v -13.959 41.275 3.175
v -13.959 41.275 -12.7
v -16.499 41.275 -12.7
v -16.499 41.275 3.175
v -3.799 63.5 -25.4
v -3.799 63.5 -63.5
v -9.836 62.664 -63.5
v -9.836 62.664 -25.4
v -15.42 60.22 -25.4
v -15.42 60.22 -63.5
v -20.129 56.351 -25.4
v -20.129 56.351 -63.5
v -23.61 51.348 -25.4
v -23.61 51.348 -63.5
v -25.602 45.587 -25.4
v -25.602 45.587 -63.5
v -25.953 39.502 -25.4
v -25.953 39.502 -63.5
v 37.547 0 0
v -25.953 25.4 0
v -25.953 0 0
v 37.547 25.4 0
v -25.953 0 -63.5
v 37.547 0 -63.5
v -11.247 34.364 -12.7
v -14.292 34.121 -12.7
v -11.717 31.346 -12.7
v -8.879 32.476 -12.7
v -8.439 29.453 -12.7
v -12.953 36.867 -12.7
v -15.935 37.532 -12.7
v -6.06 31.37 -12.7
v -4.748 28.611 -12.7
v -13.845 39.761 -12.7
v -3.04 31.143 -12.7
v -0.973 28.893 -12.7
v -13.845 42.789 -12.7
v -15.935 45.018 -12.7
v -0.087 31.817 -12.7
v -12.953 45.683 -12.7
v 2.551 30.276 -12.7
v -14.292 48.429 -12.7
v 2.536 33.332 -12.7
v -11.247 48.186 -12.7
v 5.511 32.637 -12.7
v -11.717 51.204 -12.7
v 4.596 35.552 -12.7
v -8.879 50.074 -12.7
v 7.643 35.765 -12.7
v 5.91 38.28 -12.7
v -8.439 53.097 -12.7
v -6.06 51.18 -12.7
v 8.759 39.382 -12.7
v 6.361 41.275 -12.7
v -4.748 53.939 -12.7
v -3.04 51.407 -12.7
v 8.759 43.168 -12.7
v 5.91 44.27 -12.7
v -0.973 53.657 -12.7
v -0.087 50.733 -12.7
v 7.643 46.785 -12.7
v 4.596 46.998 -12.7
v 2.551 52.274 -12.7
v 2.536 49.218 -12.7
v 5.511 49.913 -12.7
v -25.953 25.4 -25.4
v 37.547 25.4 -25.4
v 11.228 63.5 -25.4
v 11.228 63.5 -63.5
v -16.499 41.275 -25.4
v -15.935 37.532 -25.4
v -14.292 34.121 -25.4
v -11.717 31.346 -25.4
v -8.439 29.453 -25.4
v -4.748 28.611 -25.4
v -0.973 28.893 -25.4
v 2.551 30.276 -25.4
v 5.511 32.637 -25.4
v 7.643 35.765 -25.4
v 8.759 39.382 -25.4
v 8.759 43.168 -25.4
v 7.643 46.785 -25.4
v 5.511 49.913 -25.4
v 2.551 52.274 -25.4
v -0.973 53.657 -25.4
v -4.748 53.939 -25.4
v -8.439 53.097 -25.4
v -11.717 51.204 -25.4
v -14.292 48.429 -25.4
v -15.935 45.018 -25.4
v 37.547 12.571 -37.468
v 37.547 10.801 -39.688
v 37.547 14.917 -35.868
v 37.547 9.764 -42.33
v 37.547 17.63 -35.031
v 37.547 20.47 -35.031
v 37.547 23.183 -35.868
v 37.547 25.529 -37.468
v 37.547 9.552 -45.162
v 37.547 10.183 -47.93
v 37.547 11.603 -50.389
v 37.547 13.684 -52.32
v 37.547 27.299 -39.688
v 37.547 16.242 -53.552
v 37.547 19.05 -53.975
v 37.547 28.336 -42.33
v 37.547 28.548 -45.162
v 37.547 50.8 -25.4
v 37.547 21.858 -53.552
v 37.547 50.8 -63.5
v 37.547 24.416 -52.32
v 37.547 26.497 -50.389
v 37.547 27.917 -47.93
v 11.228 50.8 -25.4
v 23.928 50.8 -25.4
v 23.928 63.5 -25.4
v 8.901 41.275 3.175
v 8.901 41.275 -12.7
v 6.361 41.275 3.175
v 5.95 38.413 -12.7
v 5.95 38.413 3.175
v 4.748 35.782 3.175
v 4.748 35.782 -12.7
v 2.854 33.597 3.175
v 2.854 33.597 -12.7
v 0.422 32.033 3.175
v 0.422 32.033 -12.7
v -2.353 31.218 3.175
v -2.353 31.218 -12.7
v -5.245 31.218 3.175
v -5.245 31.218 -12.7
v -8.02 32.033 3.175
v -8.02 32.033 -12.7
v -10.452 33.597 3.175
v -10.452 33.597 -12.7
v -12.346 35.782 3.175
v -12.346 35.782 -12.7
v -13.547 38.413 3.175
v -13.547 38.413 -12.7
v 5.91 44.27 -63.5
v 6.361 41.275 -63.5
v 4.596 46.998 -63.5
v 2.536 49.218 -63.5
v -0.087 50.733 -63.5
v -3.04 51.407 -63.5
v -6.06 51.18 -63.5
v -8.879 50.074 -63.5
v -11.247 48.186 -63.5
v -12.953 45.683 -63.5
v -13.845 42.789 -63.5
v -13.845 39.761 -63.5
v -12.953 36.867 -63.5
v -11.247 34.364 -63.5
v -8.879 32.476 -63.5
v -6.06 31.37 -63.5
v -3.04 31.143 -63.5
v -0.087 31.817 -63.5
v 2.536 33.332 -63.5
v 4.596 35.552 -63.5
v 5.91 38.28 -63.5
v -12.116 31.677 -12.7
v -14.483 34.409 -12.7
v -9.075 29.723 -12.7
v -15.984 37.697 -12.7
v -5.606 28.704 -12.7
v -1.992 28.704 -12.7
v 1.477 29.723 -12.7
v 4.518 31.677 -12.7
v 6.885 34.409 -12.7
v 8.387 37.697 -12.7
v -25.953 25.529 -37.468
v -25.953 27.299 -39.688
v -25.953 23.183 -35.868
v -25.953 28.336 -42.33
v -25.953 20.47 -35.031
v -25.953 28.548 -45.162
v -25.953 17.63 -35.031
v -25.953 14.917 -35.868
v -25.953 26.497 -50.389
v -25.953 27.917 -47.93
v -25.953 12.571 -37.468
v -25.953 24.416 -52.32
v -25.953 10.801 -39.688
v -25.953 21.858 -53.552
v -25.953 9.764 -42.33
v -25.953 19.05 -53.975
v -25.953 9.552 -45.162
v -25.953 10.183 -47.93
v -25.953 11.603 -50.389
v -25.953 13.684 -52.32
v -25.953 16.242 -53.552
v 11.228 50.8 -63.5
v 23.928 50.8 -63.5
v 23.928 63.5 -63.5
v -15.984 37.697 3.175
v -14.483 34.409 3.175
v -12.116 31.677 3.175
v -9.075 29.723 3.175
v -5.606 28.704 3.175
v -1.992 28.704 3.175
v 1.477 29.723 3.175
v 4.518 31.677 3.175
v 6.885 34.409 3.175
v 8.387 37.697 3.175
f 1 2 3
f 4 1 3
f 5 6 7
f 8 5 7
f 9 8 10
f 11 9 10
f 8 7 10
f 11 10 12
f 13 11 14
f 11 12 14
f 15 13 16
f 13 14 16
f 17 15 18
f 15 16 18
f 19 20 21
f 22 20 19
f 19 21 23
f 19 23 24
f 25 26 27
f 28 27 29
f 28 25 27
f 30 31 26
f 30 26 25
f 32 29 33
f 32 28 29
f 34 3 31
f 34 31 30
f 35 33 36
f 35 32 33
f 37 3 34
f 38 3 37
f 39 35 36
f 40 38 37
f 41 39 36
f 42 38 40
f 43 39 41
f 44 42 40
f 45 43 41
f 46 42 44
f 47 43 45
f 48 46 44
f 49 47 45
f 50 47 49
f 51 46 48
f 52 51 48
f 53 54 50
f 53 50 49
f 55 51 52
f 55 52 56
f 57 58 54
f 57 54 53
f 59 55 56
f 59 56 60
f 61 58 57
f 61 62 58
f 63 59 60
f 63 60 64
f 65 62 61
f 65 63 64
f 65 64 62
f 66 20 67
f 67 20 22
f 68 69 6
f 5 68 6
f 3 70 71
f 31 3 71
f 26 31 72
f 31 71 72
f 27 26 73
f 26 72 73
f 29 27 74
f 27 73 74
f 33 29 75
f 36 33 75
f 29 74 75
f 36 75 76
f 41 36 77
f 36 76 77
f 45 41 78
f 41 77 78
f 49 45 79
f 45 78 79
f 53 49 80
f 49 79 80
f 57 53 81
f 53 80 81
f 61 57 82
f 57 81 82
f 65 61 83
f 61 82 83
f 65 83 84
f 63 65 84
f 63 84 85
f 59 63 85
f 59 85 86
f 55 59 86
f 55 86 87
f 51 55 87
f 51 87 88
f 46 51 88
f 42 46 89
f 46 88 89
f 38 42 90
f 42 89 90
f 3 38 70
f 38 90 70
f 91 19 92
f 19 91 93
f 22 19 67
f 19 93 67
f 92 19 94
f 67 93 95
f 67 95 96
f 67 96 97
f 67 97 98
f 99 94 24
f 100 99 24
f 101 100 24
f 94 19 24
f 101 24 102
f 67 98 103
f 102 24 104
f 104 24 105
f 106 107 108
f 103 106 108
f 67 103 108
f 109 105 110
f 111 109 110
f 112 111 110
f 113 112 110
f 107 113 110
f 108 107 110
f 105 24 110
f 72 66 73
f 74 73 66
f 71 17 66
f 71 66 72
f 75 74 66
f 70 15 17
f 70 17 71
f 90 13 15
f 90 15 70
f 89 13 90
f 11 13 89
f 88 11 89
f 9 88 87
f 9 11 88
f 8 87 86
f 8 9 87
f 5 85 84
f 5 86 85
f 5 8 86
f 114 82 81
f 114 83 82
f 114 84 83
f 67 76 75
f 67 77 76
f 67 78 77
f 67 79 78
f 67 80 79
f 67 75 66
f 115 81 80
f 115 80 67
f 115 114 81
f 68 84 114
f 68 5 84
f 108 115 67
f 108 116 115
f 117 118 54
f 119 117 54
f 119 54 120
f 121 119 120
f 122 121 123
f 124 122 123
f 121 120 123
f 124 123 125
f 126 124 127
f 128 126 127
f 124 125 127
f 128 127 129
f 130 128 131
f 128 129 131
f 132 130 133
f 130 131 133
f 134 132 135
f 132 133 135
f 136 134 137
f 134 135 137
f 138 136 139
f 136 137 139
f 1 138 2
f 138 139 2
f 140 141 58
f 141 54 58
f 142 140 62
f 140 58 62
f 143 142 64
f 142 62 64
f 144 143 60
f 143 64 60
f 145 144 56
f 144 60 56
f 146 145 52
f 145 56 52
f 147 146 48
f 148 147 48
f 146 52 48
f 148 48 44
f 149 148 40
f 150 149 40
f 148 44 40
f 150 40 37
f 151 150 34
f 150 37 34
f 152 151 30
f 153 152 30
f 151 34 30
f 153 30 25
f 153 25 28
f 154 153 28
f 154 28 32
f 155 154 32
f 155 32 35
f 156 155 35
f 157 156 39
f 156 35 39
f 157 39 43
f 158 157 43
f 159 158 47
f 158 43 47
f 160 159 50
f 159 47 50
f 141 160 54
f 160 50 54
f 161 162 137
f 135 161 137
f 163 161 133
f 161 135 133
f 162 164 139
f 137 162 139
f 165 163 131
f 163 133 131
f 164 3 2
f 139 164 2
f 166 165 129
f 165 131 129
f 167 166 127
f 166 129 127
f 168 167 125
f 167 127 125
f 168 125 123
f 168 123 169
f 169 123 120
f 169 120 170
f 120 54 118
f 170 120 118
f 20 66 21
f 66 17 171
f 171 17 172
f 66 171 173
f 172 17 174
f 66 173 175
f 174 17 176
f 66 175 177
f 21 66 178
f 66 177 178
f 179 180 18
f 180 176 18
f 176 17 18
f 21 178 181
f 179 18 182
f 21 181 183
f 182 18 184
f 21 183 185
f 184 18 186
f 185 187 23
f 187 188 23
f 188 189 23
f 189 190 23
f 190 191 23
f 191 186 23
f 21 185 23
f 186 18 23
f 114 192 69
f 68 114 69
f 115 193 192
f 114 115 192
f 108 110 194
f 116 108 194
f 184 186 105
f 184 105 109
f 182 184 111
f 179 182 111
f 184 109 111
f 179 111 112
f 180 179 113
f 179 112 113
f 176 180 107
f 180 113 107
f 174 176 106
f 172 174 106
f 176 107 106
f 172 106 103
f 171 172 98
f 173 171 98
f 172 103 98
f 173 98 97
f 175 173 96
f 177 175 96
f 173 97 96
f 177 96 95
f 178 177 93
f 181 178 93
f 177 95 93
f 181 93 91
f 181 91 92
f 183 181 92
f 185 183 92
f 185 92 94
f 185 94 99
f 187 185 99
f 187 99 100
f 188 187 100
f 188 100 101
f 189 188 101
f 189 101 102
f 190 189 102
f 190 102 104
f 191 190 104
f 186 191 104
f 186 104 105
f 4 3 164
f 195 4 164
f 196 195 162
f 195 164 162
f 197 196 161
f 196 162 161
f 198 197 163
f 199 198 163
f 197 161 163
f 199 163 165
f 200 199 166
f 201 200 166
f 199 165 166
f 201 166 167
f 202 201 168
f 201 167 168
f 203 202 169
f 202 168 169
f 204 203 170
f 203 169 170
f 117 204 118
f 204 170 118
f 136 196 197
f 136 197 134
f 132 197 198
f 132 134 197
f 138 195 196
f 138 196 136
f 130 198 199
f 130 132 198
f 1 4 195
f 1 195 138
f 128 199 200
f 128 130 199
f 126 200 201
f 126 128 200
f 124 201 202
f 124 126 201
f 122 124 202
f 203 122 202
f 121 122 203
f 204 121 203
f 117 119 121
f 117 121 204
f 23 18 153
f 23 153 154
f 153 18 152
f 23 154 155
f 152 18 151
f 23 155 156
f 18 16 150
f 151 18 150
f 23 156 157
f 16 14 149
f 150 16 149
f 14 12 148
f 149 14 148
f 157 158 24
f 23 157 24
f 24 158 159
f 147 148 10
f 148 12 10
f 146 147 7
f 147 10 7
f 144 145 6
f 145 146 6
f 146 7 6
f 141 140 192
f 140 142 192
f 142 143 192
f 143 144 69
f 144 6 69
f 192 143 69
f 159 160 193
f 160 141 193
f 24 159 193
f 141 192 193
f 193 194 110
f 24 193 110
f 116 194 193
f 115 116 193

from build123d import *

# Parameters (mm, degrees)
SKETCH1_W           = 63.5
SKETCH1_H           = 25.4
BOSS_EXTRUDE1_DEPTH = 63.5
BOSS_EXTRUDE2_DEPTH = 38.1
BOSS_EXTRUDE3_DEPTH = 12.7
BOSS_EXTRUDE4_DEPTH = 15.875
SKETCH5_R           = 10.16
CUT_EXTRUDE1_DEPTH  = 84.027885603
SKETCH6_R           = 9.525
CUT_EXTRUDE2_DEPTH  = 111.026122617


with BuildPart() as part:
    # Sketch1 → Boss-Extrude1 (new body)
    with BuildSketch(Plane.XY):
        with Locations((5.796901173, 12.7)):
            Rectangle(SKETCH1_W, SKETCH1_H)
    extrude(amount=-BOSS_EXTRUDE1_DEPTH)

    # Sketch2 → Boss-Extrude2 (add)
    with BuildSketch(Plane(origin=(0, 0, -63.5), x_dir=(-1, 0, 0), z_dir=(0, 0, -1))):
        with BuildLine():
            Line((-37.546901173, 25.4), (-37.546901173, 50.8))
            Line((-37.546901173, 50.8), (-23.927818555, 63.5))
            Line((-23.927818555, 63.5), (-23.927818555, 50.8))
            Line((-23.927818555, 50.8), (-11.227818555, 50.8))
            Line((-11.227818555, 50.8), (-11.227818555, 63.5))
            Line((-11.227818555, 63.5), (3.79890705, 63.5))
            ThreePointArc((3.79890705, 63.5), (20.129071571, 56.350687438), (25.953098827, 39.502315117))
            Line((25.953098827, 39.502315117), (25.953098827, 25.4))
            Line((25.953098827, 25.4), (-37.546901173, 25.4))
        make_face()
    extrude(amount=-BOSS_EXTRUDE2_DEPTH)

    # Sketch3 → Boss-Extrude3 (add)
    with BuildSketch(Plane.XY.offset(-25.4)):
        with BuildLine():
            ThreePointArc((-13.95890705, 41.275), (-3.79890705, 51.435), (6.36109295, 41.275))
            Line((6.36109295, 41.275), (8.90109295, 41.275))
            ThreePointArc((8.90109295, 41.275), (-3.79890705, 53.975), (-16.49890705, 41.275))
            Line((-16.49890705, 41.275), (-13.95890705, 41.275))
        make_face()
        with BuildLine():
            Line((8.90109295, 41.275), (6.36109295, 41.275))
            ThreePointArc((6.36109295, 41.275), (-3.79890705, 31.115), (-13.95890705, 41.275))
            Line((-13.95890705, 41.275), (-16.49890705, 41.275))
            ThreePointArc((-16.49890705, 41.275), (-3.79890705, 28.575), (8.90109295, 41.275))
        make_face()
    extrude(amount=BOSS_EXTRUDE3_DEPTH)

    # Sketch5 → Cut-Extrude1 (cut, through all)
    with BuildSketch(Plane.XY.offset(-25.4)):
        with Locations((-3.79890705, 41.275)):
            Circle(SKETCH5_R)
    extrude(amount=-CUT_EXTRUDE1_DEPTH, mode=Mode.SUBTRACT)

    # Sketch6 → Cut-Extrude2 (cut, through all)
    with BuildSketch(Plane(origin=(37.546901173, 0, 0), x_dir=(0, 0, -1), z_dir=(1, 0, 0))):
        with Locations((44.45, 19.05)):
            Circle(SKETCH6_R)
    extrude(amount=-CUT_EXTRUDE2_DEPTH, mode=Mode.SUBTRACT)


with BuildPart() as body_2:
    # Sketch4 → Boss-Extrude4 (new body)
    with BuildSketch(Plane.XY.offset(-12.7)):
        with BuildLine():
            Line((-13.95890705, 41.275), (-16.49890705, 41.275))
            ThreePointArc((-16.49890705, 41.275), (-3.79890705, 28.575), (8.90109295, 41.275))
            Line((8.90109295, 41.275), (6.36109295, 41.275))
            ThreePointArc((6.36109295, 41.275), (-3.79890705, 31.115), (-13.95890705, 41.275))
        make_face()
    extrude(amount=BOSS_EXTRUDE4_DEPTH)


solid = Compound([part.part, body_2.part])
